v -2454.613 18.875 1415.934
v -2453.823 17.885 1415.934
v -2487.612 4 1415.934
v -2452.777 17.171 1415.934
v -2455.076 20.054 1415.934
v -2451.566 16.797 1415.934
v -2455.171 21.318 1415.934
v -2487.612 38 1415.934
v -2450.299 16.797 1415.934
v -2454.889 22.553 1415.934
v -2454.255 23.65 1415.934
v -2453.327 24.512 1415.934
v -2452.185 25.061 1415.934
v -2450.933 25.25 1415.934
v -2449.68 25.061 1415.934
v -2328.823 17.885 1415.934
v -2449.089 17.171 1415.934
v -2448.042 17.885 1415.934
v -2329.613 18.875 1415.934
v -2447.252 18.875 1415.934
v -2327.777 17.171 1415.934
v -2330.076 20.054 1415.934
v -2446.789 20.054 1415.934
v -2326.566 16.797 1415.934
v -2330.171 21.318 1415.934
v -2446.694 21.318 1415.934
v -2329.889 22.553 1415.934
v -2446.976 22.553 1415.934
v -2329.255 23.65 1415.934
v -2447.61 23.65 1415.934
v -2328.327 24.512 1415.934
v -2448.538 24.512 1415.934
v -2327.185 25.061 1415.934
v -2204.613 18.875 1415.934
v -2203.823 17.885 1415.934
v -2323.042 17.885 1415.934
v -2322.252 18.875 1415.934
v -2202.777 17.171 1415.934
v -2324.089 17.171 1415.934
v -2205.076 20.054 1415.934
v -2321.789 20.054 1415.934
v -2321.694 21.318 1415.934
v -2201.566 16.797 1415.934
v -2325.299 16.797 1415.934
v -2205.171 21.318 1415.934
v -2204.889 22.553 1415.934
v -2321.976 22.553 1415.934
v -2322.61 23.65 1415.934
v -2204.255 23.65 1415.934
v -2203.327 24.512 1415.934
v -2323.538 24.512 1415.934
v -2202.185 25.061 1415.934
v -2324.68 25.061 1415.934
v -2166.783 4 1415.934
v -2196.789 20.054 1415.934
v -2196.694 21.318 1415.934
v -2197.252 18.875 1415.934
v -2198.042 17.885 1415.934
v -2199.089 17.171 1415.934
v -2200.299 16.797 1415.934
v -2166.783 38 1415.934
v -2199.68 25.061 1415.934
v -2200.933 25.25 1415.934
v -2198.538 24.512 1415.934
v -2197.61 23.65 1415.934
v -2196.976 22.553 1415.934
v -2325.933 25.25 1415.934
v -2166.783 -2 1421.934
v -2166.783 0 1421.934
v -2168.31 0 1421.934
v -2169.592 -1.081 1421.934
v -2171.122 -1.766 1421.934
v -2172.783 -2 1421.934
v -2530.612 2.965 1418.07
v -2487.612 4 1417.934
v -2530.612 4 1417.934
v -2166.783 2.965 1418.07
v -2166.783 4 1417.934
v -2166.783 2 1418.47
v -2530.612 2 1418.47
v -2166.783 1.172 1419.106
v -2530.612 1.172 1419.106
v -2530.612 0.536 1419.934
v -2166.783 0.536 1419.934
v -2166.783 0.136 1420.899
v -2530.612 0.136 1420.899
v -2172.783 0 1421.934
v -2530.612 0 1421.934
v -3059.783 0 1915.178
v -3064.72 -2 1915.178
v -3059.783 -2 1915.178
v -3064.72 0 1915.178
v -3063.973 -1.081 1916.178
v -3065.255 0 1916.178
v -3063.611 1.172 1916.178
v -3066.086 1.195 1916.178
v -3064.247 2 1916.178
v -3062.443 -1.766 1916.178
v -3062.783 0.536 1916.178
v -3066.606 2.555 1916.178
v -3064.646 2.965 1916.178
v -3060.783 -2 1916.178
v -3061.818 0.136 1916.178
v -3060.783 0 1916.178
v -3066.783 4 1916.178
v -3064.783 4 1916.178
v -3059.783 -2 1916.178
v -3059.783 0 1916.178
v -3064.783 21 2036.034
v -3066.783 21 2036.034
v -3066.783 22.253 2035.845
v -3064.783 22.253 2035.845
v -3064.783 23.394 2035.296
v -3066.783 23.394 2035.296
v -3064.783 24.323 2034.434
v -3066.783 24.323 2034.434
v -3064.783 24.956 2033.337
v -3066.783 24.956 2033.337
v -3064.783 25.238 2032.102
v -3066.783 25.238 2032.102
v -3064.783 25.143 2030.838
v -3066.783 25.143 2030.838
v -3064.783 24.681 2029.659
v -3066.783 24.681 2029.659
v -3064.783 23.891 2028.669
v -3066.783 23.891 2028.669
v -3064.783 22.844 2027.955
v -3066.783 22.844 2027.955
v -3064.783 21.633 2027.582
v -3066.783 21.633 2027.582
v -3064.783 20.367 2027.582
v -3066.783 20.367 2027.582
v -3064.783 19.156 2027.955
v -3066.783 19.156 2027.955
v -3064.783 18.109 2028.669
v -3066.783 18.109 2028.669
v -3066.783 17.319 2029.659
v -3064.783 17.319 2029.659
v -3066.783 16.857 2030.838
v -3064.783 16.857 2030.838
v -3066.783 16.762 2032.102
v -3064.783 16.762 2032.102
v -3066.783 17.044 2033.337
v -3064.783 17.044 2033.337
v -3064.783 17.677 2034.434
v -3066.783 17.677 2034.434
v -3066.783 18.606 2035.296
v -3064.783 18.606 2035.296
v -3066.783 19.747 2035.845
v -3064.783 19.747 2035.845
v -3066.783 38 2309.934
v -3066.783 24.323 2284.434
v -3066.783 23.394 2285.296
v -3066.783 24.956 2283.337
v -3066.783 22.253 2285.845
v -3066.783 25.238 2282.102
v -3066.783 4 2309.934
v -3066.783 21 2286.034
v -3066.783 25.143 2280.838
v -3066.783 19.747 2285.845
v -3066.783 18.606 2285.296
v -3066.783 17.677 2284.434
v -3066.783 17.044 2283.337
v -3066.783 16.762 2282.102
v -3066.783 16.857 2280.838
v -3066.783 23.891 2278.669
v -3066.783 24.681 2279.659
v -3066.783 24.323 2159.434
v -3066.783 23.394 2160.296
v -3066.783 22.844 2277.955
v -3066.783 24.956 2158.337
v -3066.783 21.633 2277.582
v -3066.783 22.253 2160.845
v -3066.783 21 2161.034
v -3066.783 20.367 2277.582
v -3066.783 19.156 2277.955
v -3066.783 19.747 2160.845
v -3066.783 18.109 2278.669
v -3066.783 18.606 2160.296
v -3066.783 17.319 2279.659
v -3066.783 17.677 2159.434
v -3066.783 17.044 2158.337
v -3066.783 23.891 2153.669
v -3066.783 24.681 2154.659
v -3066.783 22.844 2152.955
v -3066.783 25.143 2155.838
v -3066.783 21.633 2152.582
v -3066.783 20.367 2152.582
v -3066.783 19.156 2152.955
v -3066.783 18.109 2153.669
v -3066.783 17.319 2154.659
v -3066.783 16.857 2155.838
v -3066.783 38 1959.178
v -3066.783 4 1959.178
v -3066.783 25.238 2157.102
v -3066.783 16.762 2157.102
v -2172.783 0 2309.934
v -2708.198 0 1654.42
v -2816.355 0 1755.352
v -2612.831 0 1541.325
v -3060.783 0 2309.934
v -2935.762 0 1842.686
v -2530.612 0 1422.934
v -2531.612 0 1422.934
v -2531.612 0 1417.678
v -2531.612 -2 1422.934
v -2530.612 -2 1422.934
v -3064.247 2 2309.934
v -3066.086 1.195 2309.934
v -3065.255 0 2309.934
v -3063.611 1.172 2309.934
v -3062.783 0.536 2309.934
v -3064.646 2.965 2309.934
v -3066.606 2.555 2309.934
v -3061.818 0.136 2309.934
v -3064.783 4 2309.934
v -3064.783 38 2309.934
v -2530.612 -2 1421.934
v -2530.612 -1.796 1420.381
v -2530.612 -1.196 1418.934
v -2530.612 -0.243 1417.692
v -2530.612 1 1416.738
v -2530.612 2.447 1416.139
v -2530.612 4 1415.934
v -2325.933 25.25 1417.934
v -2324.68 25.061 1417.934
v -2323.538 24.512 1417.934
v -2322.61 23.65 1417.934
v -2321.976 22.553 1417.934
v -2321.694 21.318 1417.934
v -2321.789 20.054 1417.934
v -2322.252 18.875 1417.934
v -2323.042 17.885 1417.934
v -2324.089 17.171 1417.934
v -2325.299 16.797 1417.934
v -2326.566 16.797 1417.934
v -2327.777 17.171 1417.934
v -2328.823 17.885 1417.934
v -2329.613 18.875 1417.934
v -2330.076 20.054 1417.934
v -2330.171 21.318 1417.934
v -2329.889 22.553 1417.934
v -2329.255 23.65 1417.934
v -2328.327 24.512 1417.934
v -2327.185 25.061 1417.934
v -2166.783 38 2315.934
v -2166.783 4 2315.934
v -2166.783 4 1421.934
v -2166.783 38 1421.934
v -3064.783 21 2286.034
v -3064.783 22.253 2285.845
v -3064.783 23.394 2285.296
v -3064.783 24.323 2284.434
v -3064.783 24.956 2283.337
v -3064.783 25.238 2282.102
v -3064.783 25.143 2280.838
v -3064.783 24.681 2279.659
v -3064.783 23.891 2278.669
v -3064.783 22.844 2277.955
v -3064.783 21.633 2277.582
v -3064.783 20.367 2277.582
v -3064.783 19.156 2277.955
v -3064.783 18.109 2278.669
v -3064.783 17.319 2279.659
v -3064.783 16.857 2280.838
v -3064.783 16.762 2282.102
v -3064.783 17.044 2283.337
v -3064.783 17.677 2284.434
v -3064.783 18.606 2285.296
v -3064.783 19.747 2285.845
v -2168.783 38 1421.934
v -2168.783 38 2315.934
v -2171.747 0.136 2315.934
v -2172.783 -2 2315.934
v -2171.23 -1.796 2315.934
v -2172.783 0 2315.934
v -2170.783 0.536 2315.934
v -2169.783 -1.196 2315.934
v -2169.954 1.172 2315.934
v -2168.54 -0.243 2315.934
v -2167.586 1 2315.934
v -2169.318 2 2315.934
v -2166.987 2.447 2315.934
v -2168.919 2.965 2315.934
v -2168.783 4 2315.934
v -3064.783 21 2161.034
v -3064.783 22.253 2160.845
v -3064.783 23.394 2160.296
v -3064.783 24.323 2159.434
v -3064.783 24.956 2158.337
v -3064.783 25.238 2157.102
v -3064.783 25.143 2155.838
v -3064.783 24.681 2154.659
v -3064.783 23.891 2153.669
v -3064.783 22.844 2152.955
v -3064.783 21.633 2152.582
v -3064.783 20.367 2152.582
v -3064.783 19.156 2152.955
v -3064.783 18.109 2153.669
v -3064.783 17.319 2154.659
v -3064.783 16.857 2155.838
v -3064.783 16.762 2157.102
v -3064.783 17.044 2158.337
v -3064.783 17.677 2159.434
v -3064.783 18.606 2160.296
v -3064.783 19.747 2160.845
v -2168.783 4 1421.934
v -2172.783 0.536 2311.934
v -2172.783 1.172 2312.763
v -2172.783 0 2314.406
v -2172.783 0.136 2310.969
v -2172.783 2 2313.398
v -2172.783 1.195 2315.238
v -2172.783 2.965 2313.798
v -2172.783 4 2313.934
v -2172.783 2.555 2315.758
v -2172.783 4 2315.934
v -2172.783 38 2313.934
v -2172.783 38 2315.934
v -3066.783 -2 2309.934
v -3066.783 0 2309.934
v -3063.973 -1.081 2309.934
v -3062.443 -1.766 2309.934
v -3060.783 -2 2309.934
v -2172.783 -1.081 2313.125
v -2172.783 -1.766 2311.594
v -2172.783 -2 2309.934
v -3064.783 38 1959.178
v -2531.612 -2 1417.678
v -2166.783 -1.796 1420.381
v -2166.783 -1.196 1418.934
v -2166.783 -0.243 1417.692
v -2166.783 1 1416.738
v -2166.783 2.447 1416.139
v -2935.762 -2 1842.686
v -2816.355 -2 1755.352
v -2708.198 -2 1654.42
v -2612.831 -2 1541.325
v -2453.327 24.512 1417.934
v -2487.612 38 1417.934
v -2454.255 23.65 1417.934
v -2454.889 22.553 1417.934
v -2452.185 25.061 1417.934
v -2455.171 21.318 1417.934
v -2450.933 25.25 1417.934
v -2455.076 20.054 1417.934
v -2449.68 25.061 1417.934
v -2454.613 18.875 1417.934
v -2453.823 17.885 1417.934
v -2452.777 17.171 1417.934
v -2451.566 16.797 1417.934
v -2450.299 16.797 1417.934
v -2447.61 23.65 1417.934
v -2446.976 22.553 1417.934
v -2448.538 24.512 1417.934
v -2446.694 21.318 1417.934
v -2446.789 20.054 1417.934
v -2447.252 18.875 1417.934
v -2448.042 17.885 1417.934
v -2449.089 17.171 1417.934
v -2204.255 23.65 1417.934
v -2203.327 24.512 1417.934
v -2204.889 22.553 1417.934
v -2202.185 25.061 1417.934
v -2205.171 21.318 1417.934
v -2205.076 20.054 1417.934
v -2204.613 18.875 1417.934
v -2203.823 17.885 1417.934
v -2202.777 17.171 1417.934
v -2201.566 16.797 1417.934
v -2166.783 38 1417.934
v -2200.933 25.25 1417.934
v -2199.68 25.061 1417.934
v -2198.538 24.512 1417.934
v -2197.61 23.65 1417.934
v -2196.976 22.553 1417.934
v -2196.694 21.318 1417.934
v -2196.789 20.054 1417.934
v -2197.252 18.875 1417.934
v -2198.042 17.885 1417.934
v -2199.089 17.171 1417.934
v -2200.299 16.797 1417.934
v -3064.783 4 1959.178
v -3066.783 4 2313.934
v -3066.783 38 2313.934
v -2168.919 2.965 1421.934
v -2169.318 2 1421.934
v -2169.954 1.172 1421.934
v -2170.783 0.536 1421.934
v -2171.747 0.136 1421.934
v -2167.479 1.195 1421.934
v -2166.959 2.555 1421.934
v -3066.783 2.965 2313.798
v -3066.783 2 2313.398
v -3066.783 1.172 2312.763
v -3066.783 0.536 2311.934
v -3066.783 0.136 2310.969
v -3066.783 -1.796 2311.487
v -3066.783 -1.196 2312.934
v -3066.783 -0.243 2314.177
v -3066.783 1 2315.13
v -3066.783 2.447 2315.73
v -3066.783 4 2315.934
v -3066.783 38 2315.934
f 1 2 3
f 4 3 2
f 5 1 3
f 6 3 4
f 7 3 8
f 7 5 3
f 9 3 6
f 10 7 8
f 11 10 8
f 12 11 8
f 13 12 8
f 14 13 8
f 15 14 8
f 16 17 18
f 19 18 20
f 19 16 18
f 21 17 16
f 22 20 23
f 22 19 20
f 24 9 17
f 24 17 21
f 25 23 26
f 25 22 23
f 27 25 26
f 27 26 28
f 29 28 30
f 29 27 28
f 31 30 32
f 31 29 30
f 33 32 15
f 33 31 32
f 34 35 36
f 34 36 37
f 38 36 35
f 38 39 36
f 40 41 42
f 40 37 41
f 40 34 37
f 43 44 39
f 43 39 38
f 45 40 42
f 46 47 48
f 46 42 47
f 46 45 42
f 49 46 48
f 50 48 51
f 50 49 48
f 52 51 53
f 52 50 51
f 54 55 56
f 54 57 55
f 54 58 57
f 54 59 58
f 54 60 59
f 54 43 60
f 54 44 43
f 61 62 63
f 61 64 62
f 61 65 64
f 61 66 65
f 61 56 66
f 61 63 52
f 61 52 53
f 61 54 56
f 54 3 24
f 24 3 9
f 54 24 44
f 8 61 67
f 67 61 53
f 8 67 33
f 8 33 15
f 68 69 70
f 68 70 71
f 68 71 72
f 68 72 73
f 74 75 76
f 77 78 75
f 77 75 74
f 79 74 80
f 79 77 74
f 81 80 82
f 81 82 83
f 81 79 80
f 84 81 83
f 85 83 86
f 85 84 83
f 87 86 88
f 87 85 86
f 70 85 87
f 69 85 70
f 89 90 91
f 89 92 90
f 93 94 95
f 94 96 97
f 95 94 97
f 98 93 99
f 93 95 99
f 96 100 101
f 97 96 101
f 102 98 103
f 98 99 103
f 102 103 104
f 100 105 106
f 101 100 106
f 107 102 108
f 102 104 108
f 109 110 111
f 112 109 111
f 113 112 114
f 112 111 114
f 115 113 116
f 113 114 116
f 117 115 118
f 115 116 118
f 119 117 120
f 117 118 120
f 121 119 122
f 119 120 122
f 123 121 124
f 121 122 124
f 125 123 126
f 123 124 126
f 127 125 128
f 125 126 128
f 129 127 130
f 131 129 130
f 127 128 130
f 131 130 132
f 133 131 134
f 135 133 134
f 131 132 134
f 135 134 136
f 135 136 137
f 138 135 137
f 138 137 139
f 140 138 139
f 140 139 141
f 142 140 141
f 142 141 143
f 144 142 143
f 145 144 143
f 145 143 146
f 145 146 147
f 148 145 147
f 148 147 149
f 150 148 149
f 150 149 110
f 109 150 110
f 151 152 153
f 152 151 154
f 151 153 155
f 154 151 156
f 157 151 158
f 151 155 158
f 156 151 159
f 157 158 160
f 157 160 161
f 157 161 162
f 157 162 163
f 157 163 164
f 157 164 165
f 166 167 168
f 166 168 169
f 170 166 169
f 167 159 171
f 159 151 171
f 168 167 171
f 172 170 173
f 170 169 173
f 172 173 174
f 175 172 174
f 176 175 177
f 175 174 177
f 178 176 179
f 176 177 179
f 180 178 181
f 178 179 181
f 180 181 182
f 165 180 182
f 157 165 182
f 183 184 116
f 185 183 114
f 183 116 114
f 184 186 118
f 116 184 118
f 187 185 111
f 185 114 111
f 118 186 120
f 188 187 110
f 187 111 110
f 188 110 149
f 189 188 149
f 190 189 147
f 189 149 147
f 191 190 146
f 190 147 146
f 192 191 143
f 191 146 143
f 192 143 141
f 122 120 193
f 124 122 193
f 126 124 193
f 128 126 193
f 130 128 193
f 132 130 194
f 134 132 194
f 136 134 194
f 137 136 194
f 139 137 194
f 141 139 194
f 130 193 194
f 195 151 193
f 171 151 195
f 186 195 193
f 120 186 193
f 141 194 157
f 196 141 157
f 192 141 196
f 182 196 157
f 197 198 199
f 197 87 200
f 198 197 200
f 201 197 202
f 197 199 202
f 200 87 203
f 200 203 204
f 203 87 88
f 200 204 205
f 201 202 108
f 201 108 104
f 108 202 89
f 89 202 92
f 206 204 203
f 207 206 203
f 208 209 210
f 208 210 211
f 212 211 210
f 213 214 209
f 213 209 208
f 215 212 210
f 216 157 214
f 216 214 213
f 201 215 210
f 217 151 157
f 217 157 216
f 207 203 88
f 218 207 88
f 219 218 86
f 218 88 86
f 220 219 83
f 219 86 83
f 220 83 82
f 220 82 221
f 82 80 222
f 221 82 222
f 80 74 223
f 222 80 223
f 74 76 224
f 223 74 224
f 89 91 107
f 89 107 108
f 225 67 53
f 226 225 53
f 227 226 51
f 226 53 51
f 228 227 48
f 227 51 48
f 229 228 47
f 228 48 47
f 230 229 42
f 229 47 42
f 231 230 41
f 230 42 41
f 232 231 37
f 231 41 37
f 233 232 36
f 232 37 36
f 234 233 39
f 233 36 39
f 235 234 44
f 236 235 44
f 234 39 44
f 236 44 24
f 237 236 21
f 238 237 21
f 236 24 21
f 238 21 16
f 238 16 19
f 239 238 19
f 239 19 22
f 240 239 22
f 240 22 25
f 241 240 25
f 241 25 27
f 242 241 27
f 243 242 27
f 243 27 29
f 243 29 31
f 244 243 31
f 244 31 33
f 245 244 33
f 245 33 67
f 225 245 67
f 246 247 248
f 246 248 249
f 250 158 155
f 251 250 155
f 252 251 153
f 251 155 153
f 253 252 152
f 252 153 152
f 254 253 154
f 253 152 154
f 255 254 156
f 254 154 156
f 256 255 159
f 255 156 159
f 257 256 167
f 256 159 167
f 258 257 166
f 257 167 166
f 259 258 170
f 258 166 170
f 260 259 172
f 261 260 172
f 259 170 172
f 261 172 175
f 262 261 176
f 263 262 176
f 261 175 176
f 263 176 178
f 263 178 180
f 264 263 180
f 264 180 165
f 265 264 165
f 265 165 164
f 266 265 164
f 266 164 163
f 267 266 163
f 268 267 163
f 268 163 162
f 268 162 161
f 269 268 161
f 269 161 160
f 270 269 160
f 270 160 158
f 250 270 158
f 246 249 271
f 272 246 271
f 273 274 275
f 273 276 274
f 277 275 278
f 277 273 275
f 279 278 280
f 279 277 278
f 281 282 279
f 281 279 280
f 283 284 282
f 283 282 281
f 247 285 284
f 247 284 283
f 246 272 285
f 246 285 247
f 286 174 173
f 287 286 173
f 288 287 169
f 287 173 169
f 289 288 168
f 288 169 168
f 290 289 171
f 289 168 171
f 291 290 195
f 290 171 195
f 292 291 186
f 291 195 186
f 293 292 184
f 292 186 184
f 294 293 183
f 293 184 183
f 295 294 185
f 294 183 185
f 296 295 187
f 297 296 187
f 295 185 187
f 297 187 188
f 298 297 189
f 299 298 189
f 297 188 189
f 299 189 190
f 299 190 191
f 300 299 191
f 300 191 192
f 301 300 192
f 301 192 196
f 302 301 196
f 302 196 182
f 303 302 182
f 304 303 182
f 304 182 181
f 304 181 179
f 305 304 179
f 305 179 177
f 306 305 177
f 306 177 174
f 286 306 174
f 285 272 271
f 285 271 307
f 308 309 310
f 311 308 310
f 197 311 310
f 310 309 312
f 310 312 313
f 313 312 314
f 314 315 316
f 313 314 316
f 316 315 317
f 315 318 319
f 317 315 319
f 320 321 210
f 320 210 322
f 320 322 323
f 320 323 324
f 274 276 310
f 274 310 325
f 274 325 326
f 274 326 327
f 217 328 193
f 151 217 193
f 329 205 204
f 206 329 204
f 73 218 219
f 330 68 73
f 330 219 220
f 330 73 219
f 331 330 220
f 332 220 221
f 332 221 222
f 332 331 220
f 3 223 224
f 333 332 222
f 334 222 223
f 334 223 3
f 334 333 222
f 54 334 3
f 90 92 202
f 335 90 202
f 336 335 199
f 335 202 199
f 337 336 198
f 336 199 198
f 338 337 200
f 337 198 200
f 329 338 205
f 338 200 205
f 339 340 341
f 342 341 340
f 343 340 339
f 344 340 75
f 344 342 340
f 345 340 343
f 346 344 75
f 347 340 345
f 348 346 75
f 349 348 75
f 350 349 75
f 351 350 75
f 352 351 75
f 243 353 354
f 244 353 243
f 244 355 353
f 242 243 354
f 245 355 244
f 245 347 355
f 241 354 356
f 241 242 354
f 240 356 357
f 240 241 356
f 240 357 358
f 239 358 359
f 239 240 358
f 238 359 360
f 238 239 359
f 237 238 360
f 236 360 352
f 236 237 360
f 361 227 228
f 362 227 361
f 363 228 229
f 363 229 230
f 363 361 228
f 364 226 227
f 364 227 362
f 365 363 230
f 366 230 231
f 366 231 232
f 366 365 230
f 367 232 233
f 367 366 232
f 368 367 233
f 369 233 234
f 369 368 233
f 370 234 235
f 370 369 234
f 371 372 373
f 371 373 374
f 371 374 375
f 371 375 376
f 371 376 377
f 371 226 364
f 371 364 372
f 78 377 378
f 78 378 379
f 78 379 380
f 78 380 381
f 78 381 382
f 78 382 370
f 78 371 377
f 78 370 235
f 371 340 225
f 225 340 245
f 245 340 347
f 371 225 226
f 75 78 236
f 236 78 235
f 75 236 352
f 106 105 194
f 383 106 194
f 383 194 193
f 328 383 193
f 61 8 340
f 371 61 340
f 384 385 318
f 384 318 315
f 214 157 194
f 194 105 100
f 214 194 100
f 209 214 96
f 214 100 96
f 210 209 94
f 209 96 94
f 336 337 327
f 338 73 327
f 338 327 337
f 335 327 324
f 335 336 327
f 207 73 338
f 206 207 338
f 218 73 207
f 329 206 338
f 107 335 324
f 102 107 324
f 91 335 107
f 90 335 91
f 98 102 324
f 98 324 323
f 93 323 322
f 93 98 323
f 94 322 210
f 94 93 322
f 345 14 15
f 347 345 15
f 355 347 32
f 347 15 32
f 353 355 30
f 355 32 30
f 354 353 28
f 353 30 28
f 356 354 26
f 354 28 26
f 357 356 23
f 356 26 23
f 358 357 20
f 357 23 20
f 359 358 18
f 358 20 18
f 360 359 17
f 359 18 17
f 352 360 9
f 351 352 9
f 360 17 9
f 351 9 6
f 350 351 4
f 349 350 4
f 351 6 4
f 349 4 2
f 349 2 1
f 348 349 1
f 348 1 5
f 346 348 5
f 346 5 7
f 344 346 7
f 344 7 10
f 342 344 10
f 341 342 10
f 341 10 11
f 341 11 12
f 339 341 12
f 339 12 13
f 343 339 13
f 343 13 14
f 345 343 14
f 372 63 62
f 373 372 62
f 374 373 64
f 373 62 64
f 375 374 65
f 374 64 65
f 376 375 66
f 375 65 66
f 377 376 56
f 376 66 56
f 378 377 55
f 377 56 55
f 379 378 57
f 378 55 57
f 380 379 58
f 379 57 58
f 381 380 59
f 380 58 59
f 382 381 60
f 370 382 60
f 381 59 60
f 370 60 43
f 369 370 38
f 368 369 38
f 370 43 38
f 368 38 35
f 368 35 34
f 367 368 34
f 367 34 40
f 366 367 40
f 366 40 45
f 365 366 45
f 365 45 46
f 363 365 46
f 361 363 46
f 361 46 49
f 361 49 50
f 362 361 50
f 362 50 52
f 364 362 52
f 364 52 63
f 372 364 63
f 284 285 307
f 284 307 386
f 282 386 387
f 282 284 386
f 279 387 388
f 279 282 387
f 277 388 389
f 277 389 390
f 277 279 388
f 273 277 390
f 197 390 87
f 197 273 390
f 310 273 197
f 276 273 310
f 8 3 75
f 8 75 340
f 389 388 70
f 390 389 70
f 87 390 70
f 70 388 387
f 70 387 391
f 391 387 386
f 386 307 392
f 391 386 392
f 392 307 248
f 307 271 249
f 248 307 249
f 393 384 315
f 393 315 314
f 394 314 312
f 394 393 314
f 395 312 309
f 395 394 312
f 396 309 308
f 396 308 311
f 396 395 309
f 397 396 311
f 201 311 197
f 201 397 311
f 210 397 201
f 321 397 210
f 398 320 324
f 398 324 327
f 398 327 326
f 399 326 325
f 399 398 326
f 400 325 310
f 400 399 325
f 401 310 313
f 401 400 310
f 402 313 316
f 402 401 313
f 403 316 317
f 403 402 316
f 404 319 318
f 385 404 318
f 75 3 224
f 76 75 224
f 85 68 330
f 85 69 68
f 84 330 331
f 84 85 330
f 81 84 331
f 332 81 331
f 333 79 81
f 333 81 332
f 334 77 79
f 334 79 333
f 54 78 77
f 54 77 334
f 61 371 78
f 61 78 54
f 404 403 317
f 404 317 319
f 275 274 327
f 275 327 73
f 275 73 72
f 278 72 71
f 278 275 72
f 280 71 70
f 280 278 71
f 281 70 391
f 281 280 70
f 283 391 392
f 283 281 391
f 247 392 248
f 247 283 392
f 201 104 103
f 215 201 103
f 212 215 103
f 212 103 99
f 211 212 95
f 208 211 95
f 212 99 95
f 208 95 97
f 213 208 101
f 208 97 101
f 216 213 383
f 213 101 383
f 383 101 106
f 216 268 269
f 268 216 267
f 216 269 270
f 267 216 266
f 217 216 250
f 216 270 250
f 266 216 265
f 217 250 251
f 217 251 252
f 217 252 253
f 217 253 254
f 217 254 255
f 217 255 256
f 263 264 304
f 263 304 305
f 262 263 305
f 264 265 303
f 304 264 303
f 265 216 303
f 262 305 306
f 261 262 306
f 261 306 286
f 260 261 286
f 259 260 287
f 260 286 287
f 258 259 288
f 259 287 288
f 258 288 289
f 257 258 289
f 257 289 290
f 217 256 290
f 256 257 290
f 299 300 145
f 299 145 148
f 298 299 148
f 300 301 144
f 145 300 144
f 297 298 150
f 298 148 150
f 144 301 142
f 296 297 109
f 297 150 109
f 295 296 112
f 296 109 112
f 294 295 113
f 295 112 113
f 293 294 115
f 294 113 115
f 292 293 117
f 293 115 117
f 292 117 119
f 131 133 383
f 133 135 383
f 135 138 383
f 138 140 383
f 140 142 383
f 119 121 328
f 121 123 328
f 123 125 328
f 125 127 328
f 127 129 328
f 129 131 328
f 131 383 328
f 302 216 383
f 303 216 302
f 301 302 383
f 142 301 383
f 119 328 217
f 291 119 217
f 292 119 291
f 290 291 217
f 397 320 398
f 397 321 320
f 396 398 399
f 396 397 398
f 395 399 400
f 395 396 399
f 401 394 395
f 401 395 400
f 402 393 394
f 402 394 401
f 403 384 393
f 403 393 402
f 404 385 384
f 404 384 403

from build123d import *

# Parameters (mm, degrees)
BASE_FLANGE1_DEPTH            = 2
EDGE_FLANGE1_STRIP_W          = 16
EDGE_FLANGE1_STRIP_H          = 2
EDGE_FLANGE1_STRIP_CUT_DEPTH  = 363.829009869
EDGE_FLANGE1_RELIEF_W         = 17
EDGE_FLANGE1_RELIEF_H         = 1
EDGE_FLANGE1_RELIEF_CUT_DEPTH = 2
EDGE_FLANGE1_DEPTH            = 363.829009869
EDGE_FLANGE2_STRIP_W          = 16
EDGE_FLANGE2_STRIP_H          = 2
EDGE_FLANGE2_STRIP_CUT_DEPTH  = 894
EDGE_FLANGE2_DEPTH            = 894
EDGE_FLANGE3_STRIP_W          = 16
EDGE_FLANGE3_STRIP_H          = 2
EDGE_FLANGE3_STRIP_CUT_DEPTH  = 894
EDGE_FLANGE3_DEPTH            = 894
EDGE_FLANGE4_START            = 1915.177869048
EDGE_FLANGE4_DEPTH            = 394.75629901
EDGE_FLANGE4_2_DEPTH          = 1
EDGE_FLANGE4_START_2          = 1916.177869048
EDGE_FLANGE4_3_DEPTH          = 393.75629901
SKETCH20_W                    = 43
SKETCH20_H                    = 34
CUT_EXTRUDE1_DEPTH            = 10
SKETCH21_W                    = 43
SKETCH21_H                    = 34
CUT_EXTRUDE2_DEPTH            = 10
SKETCH22_R                    = 4.25
CUT_EXTRUDE3_DEPTH            = 10
SKETCH23_R                    = 4.25
CUT_EXTRUDE4_DEPTH            = 10


# Read off the part's stored shape, not the designer's step: Edge-Flange4
# Sheet-metal steps are written as plain solids
with BuildPart() as part:
    # Sketch1 → Base-Flange1 (new body)
    with BuildSketch(Plane(origin=(0, 0, 0), x_dir=(1, 0, 0), z_dir=(0, 1, 0))):
        with BuildLine():
            Line((-2530.611542613, -1415.934168058), (-2166.782532744, -1415.934168058))
            Line((-2166.782532744, -1415.934168058), (-2166.782532744, -2315.934168058))
            Line((-2166.782532744, -2315.934168058), (-3066.782532744, -2315.934168058))
            Line((-3066.782532744, -2315.934168058), (-3066.782532744, -1916.177869048))
            ThreePointArc((-3066.782532744, -1916.177869048), (-2760.872899609, -1706.596670078), (-2530.611542613, -1415.934168058))
        make_face()
    extrude(amount=-BASE_FLANGE1_DEPTH)

    # Edge-Flange1 strip (across the edge) → Edge-Flange1 strip cut (cut)
    with BuildSketch(Plane(origin=(-2166.782532744, 0, 1415.934168058), x_dir=(0, 0, 1), z_dir=(-1, 0, 0))):
        with Locations((-2, -1)):
            Rectangle(EDGE_FLANGE1_STRIP_W, EDGE_FLANGE1_STRIP_H)
    extrude(amount=EDGE_FLANGE1_STRIP_CUT_DEPTH, mode=Mode.SUBTRACT)

    # Edge-Flange1 relief (on the sheet) → Edge-Flange1 relief cut (cut)
    with BuildSketch(Plane(origin=(-2166.782532744, 0, 1421.934168058), x_dir=(0, 0, 1), z_dir=(0, 1, 0))):
        with Locations((-7.5, -364.329009869)):
            Rectangle(EDGE_FLANGE1_RELIEF_W, EDGE_FLANGE1_RELIEF_H)
    extrude(amount=-EDGE_FLANGE1_RELIEF_CUT_DEPTH, mode=Mode.SUBTRACT)

    # Edge-Flange1 section (across the edge) → Edge-Flange1 (add)
    with BuildSketch(Plane(origin=(-2166.782532744, 0, 1415.934168058), x_dir=(0, 0, 1), z_dir=(-1, 0, 0))):
        with BuildLine():
            Line((0, 4), (0, 38))
            Line((0, 38), (2, 38))
            Line((2, 38), (2, 4))
            ThreePointArc((2, 4), (3.171572875, 1.171572875), (6, 0))
            Line((6, 0), (6, -2))
            ThreePointArc((6, -2), (1.757359313, -0.242640687), (0, 4))
        make_face()
    extrude(amount=EDGE_FLANGE1_DEPTH)

    # Edge-Flange2 strip (across the edge) → Edge-Flange2 strip cut (cut)
    with BuildSketch(Plane(origin=(-2166.782532744, 0, 2315.934168058), x_dir=(-1, 0, 0), z_dir=(0, 0, -1))):
        with Locations((-2, -1)):
            Rectangle(EDGE_FLANGE2_STRIP_W, EDGE_FLANGE2_STRIP_H)
    extrude(amount=EDGE_FLANGE2_STRIP_CUT_DEPTH, mode=Mode.SUBTRACT)

    # Edge-Flange2 section (across the edge) → Edge-Flange2 (add)
    with BuildSketch(Plane(origin=(-2166.782532744, 0, 2315.934168058), x_dir=(-1, 0, 0), z_dir=(0, 0, -1))):
        with BuildLine():
            Line((0, 4), (0, 38))
            Line((0, 38), (2, 38))
            Line((2, 38), (2, 4))
            ThreePointArc((2, 4), (3.171572875, 1.171572875), (6, 0))
            Line((6, 0), (6, -2))
            ThreePointArc((6, -2), (1.757359313, -0.242640687), (0, 4))
        make_face()
    extrude(amount=EDGE_FLANGE2_DEPTH)

    # Edge-Flange3 strip (across the edge) → Edge-Flange3 strip cut (cut)
    with BuildSketch(Plane(origin=(-3066.782532744, 0, 2315.934168058), x_dir=(0, 0, -1), z_dir=(1, 0, 0))):
        with Locations((-2, -1)):
            Rectangle(EDGE_FLANGE3_STRIP_W, EDGE_FLANGE3_STRIP_H)
    extrude(amount=EDGE_FLANGE3_STRIP_CUT_DEPTH, mode=Mode.SUBTRACT)

    # Edge-Flange3 section (across the edge) → Edge-Flange3 (add)
    with BuildSketch(Plane(origin=(-3066.782532744, 0, 2315.934168058), x_dir=(0, 0, -1), z_dir=(1, 0, 0))):
        with BuildLine():
            Line((0, 4), (0, 38))
            Line((0, 38), (2, 38))
            Line((2, 38), (2, 4))
            ThreePointArc((2, 4), (3.171572875, 1.171572875), (6, 0))
            Line((6, 0), (6, -2))
            ThreePointArc((6, -2), (1.757359313, -0.242640687), (0, 4))
        make_face()
    extrude(amount=EDGE_FLANGE3_DEPTH)

    # Edge-Flange4 outline → Edge-Flange4 (cut)
    with BuildSketch(Plane.XY.offset(EDGE_FLANGE4_START)):
        with BuildLine():
            ThreePointArc((-3060.782532744, -2), (-3063.232022487, -1.477225575), (-3065.254668699, 0))
            Line((-3065.254668699, 0), (-3066.782532744, 0))
            Line((-3066.782532744, 0), (-3066.782532744, -2))
            Line((-3066.782532744, -2), (-3060.782532744, -2))
        make_face()
    extrude(amount=EDGE_FLANGE4_DEPTH, mode=Mode.SUBTRACT)

    # Edge-Flange4 2 outline → Edge-Flange4 2 (cut)
    with BuildSketch(Plane.XY.offset(EDGE_FLANGE4_START)):
        with BuildLine():
            Line((-3059.782532744, 0), (-3065.254668699, 0))
            ThreePointArc((-3065.254668699, 0), (-3063.232022487, -1.477225575), (-3060.782532744, -2))
            Line((-3060.782532744, -2), (-3059.782532744, -2))
            Line((-3059.782532744, -2), (-3059.782532744, 0))
        make_face()
    extrude(amount=EDGE_FLANGE4_2_DEPTH, mode=Mode.SUBTRACT)

    # Edge-Flange4 3 outline → Edge-Flange4 3 (add)
    with BuildSketch(Plane.XY.offset(EDGE_FLANGE4_START_2)):
        with BuildLine():
            Line((-3064.782532744, 38), (-3066.782532744, 38))
            Line((-3066.782532744, 38), (-3066.782532744, 4))
            ThreePointArc((-3066.782532744, 4), (-3066.387566898, 1.859067461), (-3065.254668699, 0))
            Line((-3065.254668699, 0), (-3060.782532744, 0))
            ThreePointArc((-3060.782532744, 0), (-3063.610959869, 1.171572875), (-3064.782532744, 4))
            Line((-3064.782532744, 4), (-3064.782532744, 38))
        make_face()
    extrude(amount=EDGE_FLANGE4_3_DEPTH)

    # Sketch20 → Cut-Extrude1 (cut)
    with BuildSketch(Plane.ZY.offset(3066.782532744)):
        with Locations((1937.677869048, 21)):
            Rectangle(SKETCH20_W, SKETCH20_H)
    extrude(amount=-CUT_EXTRUDE1_DEPTH, mode=Mode.SUBTRACT)

    # Sketch21 → Cut-Extrude2 (cut)
    with BuildSketch(Plane(origin=(0, 0, 1415.934168058), x_dir=(-1, 0, 0), z_dir=(0, 0, -1))):
        with Locations((2509.111542613, 21)):
            Rectangle(SKETCH21_W, SKETCH21_H)
    extrude(amount=-CUT_EXTRUDE2_DEPTH, mode=Mode.SUBTRACT)

    # Sketch22 → Cut-Extrude3 (cut)
    with BuildSketch(Plane(origin=(0, 0, 1415.934168058), x_dir=(-1, 0, 0), z_dir=(0, 0, -1))):
        with Locations(Location((2200.932532744, 21, 0), (0, 0, 90))):
            Circle(SKETCH22_R)
        with Locations(Location((2325.932532744, 21, 0), (0, 0, 90))):
            Circle(SKETCH22_R)
        with Locations(Location((2450.932532744, 21, 0), (0, 0, 90))):
            Circle(SKETCH22_R)
    extrude(amount=-CUT_EXTRUDE3_DEPTH, mode=Mode.SUBTRACT)

    # Sketch23 → Cut-Extrude4 (cut)
    with BuildSketch(Plane.ZY.offset(3066.782532744)):
        with Locations((2281.784168058, 21)):
            Circle(SKETCH23_R)
        with Locations((2156.784168058, 21)):
            Circle(SKETCH23_R)
        with Locations((2031.784168058, 21)):
            Circle(SKETCH23_R)
    extrude(amount=-CUT_EXTRUDE4_DEPTH, mode=Mode.SUBTRACT)


solid = part.part
